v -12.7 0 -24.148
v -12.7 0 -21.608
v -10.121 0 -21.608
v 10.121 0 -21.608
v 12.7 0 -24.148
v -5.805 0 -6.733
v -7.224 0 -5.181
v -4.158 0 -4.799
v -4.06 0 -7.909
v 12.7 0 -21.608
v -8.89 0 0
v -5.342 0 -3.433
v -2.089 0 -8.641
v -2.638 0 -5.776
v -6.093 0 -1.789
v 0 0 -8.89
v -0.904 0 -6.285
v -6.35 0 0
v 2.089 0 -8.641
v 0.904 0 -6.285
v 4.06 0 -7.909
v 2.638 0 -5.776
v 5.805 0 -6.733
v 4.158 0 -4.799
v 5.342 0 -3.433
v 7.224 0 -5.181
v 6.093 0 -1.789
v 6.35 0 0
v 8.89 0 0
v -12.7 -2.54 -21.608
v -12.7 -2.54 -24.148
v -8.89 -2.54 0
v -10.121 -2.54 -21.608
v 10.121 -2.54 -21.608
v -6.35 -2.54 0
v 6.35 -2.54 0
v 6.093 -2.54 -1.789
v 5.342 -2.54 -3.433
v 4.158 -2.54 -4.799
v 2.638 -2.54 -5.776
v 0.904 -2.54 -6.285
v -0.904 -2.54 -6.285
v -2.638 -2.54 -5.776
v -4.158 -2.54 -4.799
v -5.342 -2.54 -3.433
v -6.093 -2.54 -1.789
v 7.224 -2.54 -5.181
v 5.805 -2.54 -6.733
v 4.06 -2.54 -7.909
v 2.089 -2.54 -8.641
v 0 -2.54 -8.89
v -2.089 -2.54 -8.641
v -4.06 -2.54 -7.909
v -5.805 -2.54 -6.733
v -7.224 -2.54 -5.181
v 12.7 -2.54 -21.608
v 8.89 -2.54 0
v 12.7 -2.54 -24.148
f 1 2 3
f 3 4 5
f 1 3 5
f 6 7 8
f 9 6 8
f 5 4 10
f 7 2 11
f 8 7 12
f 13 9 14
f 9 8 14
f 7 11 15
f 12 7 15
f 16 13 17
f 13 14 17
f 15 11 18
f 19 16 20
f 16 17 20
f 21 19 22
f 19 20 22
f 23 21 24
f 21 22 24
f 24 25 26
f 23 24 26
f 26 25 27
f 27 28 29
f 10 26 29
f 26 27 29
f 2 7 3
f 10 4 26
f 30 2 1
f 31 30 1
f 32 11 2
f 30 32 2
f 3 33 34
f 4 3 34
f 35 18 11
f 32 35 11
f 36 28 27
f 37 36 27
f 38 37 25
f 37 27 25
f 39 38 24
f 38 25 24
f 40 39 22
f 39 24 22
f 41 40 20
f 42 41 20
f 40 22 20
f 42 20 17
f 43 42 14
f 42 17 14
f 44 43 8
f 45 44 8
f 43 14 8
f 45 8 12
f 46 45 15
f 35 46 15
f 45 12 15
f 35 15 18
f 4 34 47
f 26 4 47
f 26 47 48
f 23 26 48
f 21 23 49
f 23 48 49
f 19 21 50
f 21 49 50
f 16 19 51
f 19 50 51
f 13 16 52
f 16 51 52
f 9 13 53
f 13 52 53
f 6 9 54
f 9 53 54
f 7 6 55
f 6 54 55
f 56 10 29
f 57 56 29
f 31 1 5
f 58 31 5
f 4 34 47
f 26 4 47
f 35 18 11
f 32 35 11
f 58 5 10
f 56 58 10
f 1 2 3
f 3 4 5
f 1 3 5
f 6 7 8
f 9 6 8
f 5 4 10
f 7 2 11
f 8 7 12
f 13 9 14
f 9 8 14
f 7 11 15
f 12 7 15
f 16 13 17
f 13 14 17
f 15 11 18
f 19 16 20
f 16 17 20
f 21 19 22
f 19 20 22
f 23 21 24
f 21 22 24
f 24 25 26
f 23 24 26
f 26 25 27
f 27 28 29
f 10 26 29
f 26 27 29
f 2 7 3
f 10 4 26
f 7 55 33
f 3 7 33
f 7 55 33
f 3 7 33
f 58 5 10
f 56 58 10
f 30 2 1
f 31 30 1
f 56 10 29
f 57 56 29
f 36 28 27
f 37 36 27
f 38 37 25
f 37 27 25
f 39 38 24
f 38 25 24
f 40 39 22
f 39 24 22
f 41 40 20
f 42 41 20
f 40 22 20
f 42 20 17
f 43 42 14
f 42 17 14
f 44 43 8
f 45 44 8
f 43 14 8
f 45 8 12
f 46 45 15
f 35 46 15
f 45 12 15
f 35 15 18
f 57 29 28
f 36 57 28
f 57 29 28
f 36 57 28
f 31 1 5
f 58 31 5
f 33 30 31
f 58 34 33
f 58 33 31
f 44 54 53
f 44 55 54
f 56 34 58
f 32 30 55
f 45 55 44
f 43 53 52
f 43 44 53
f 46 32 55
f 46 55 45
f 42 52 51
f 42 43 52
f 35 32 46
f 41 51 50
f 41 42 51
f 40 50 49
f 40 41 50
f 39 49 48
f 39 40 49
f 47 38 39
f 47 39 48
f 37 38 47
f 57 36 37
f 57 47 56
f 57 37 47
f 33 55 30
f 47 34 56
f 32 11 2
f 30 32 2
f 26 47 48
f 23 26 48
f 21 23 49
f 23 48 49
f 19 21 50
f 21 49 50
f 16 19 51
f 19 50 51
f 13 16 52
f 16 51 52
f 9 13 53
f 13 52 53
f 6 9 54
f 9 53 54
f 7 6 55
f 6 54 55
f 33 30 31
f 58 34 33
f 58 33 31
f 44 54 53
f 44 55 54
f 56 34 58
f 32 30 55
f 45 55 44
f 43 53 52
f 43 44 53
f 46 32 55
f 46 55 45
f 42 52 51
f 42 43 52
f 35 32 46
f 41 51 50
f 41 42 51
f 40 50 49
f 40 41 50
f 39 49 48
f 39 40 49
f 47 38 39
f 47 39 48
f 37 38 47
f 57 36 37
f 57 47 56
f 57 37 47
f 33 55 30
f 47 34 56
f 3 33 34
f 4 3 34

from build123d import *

# Parameters (mm, degrees)
F1_DEPTH = 2.54
F4_DEPTH = 2.541


with BuildPart() as f1:
    # F0 (on Front) → F1 (new body)
    with BuildSketch(Plane.XZ):
        with BuildLine():
            ThreePointArc((6.35, 0), (0, -6.35), (-6.35, 0))
            Line((-6.35, 0), (-8.89, 0))
            Line((-8.89, 0), (-12.7, -21.607584))
            Line((-12.7, -21.607584), (-12.7, -24.147584))
            Line((-12.7, -24.147584), (12.7, -24.147584))
            Line((12.7, -24.147584), (12.7, -21.607584))
            Line((12.7, -21.607584), (8.89, 0))
            Line((8.89, 0), (6.35, 0))
        make_face()
    extrude(amount=F1_DEPTH)


with BuildPart() as f2_1:
    # F2: copy of F1
    add(f1.part)


with BuildPart() as f4_tool:
    # F3 (on face) → F4 (new body, through all)
    with BuildSketch(Plane.XZ.offset(2.54)):
        with BuildLine():
            Line((-7.224337, -5.180835), (-10.120816, -21.607584))
            Line((-10.120816, -21.607584), (10.120816, -21.607584))
            Line((10.120816, -21.607584), (7.224337, -5.180835))
            ThreePointArc((7.224337, -5.180835), (0, -8.89), (-7.224337, -5.180835))
        make_face()
    extrude(amount=-F4_DEPTH)


with BuildPart() as f1_1:
    add(f1.part)

    # F4: cut by f4_tool
    add(f4_tool.part, mode=Mode.SUBTRACT)


with BuildPart() as f2_1_1:
    add(f2_1.part)

    # F4: cut by f4_tool
    add(f4_tool.part, mode=Mode.SUBTRACT)


solid = Compound([f1_1.part, f2_1_1.part])
